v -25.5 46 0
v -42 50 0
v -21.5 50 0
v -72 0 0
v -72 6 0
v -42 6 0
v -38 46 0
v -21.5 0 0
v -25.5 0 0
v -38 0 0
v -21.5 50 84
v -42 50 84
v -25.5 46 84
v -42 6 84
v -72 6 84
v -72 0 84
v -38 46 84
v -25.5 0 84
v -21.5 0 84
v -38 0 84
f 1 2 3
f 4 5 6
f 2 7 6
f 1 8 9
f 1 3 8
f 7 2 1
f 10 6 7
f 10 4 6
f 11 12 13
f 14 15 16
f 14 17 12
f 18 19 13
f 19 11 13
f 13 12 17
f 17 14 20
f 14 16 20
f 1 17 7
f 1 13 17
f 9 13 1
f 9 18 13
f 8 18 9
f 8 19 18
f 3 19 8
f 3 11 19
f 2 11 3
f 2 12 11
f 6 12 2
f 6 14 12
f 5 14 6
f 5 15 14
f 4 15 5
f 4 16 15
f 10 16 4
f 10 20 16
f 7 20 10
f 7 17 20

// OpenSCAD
// PCR Strip Holder for Ice Bucket
// Designed to hang over a 12mm wall and hold an 8-tube PCR strip.

// --- Dimensions ---
length_x      = 84.0;    // Extrusion length along X
wall_gap      = 12.5;    // Gap for the bucket wall (16.5 - 4.0 = 12.5)
inner_leg_h    = 50.0;    // Height of the inner leg
outer_leg_h    = 50.0;    // Height of the outer leg
leg_thickness  = 4.0;     // Thickness of the legs (20.5 - 16.5 = 4.0)
bridge_h       = 4.0;     // Height of the top bridge (50 - 46 = 4)
ledge_thick    = 6.0;     // Thickness of the ledge (z = 0 to 6)
ledge_depth    = 30.0;    // Depth of the ledge into the ice (y = 0 to -30)
tube_hole_d    = 6.4;     // Diameter of the PCR tube holes
tube_pitch     = 9.0;     // Spacing between tube holes along X
num_tubes      = 8;       // Number of tubes

$fn = 64;

// --- Calculations ---
// The profile is defined in the YZ plane.
// Inner leg: y from 0 to 4, z from 0 to 50.
// Outer leg: y from 16.5 to 20.5, z from 0 to 50.
// Bridge: y from 4 to 16.5, z from 46 to 50.
// Ledge: y from -30 to 0, z from 0 to 6.

// Calculate X-offset for the holes to be centered
// Holes are at [i - (n-1)/2] * pitch
// For 8 tubes, indices are -3.5, -2.5, -1.5, -0.5, 0.5, 1.5, 2.5, 3.5
// Total span = (8-1) * 9 = 63mm.

module profile_yz() {
    difference() {
        // Main U-shape profile
        union() {
            // Inner Leg
            translate([0, 0]) square([leg_thickness, inner_leg_h]);
            // Outer Leg
            translate([wall_gap + leg_thickness, 0]) square([leg_thickness, outer_leg_h]);
            // Bridge
            translate([0, 46]) square([wall_gap + 2 * leg_thickness, bridge_h]);
            // Ledge
            translate([-ledge_depth, 0]) square([ledge_depth + leg_thickness, ledge_thick]);
        }
        
        // Subtract the tube holes from the ledge
        // Holes are at y = -15 (relative to the profile's Y=0)
        // In our profile, the ledge is from y = -30 to 0.
        // We need to translate the holes to the correct Y position.
        // The ledge is part of the profile, so we subtract holes from the extruded shape.
        for (i = [0 : num_tubes - 1]) {
            let (x_pos = (i - (num_tubes - 1) / 2) * tube_pitch)
            translate([x_pos, -15, -1]) 
                cylinder(h = ledge_thick + 2, d = tube_hole_d);
        }
    }
}

// --- Final Assembly ---
// The profile is extruded along X.
// The user wants it centered on X, so we translate by -length_x/2.
// The profile is in YZ plane, so we extrude along X.

translate([-length_x / 2, 0, 0])
    linear_extrude(height = length_x)
        profile_yz();
